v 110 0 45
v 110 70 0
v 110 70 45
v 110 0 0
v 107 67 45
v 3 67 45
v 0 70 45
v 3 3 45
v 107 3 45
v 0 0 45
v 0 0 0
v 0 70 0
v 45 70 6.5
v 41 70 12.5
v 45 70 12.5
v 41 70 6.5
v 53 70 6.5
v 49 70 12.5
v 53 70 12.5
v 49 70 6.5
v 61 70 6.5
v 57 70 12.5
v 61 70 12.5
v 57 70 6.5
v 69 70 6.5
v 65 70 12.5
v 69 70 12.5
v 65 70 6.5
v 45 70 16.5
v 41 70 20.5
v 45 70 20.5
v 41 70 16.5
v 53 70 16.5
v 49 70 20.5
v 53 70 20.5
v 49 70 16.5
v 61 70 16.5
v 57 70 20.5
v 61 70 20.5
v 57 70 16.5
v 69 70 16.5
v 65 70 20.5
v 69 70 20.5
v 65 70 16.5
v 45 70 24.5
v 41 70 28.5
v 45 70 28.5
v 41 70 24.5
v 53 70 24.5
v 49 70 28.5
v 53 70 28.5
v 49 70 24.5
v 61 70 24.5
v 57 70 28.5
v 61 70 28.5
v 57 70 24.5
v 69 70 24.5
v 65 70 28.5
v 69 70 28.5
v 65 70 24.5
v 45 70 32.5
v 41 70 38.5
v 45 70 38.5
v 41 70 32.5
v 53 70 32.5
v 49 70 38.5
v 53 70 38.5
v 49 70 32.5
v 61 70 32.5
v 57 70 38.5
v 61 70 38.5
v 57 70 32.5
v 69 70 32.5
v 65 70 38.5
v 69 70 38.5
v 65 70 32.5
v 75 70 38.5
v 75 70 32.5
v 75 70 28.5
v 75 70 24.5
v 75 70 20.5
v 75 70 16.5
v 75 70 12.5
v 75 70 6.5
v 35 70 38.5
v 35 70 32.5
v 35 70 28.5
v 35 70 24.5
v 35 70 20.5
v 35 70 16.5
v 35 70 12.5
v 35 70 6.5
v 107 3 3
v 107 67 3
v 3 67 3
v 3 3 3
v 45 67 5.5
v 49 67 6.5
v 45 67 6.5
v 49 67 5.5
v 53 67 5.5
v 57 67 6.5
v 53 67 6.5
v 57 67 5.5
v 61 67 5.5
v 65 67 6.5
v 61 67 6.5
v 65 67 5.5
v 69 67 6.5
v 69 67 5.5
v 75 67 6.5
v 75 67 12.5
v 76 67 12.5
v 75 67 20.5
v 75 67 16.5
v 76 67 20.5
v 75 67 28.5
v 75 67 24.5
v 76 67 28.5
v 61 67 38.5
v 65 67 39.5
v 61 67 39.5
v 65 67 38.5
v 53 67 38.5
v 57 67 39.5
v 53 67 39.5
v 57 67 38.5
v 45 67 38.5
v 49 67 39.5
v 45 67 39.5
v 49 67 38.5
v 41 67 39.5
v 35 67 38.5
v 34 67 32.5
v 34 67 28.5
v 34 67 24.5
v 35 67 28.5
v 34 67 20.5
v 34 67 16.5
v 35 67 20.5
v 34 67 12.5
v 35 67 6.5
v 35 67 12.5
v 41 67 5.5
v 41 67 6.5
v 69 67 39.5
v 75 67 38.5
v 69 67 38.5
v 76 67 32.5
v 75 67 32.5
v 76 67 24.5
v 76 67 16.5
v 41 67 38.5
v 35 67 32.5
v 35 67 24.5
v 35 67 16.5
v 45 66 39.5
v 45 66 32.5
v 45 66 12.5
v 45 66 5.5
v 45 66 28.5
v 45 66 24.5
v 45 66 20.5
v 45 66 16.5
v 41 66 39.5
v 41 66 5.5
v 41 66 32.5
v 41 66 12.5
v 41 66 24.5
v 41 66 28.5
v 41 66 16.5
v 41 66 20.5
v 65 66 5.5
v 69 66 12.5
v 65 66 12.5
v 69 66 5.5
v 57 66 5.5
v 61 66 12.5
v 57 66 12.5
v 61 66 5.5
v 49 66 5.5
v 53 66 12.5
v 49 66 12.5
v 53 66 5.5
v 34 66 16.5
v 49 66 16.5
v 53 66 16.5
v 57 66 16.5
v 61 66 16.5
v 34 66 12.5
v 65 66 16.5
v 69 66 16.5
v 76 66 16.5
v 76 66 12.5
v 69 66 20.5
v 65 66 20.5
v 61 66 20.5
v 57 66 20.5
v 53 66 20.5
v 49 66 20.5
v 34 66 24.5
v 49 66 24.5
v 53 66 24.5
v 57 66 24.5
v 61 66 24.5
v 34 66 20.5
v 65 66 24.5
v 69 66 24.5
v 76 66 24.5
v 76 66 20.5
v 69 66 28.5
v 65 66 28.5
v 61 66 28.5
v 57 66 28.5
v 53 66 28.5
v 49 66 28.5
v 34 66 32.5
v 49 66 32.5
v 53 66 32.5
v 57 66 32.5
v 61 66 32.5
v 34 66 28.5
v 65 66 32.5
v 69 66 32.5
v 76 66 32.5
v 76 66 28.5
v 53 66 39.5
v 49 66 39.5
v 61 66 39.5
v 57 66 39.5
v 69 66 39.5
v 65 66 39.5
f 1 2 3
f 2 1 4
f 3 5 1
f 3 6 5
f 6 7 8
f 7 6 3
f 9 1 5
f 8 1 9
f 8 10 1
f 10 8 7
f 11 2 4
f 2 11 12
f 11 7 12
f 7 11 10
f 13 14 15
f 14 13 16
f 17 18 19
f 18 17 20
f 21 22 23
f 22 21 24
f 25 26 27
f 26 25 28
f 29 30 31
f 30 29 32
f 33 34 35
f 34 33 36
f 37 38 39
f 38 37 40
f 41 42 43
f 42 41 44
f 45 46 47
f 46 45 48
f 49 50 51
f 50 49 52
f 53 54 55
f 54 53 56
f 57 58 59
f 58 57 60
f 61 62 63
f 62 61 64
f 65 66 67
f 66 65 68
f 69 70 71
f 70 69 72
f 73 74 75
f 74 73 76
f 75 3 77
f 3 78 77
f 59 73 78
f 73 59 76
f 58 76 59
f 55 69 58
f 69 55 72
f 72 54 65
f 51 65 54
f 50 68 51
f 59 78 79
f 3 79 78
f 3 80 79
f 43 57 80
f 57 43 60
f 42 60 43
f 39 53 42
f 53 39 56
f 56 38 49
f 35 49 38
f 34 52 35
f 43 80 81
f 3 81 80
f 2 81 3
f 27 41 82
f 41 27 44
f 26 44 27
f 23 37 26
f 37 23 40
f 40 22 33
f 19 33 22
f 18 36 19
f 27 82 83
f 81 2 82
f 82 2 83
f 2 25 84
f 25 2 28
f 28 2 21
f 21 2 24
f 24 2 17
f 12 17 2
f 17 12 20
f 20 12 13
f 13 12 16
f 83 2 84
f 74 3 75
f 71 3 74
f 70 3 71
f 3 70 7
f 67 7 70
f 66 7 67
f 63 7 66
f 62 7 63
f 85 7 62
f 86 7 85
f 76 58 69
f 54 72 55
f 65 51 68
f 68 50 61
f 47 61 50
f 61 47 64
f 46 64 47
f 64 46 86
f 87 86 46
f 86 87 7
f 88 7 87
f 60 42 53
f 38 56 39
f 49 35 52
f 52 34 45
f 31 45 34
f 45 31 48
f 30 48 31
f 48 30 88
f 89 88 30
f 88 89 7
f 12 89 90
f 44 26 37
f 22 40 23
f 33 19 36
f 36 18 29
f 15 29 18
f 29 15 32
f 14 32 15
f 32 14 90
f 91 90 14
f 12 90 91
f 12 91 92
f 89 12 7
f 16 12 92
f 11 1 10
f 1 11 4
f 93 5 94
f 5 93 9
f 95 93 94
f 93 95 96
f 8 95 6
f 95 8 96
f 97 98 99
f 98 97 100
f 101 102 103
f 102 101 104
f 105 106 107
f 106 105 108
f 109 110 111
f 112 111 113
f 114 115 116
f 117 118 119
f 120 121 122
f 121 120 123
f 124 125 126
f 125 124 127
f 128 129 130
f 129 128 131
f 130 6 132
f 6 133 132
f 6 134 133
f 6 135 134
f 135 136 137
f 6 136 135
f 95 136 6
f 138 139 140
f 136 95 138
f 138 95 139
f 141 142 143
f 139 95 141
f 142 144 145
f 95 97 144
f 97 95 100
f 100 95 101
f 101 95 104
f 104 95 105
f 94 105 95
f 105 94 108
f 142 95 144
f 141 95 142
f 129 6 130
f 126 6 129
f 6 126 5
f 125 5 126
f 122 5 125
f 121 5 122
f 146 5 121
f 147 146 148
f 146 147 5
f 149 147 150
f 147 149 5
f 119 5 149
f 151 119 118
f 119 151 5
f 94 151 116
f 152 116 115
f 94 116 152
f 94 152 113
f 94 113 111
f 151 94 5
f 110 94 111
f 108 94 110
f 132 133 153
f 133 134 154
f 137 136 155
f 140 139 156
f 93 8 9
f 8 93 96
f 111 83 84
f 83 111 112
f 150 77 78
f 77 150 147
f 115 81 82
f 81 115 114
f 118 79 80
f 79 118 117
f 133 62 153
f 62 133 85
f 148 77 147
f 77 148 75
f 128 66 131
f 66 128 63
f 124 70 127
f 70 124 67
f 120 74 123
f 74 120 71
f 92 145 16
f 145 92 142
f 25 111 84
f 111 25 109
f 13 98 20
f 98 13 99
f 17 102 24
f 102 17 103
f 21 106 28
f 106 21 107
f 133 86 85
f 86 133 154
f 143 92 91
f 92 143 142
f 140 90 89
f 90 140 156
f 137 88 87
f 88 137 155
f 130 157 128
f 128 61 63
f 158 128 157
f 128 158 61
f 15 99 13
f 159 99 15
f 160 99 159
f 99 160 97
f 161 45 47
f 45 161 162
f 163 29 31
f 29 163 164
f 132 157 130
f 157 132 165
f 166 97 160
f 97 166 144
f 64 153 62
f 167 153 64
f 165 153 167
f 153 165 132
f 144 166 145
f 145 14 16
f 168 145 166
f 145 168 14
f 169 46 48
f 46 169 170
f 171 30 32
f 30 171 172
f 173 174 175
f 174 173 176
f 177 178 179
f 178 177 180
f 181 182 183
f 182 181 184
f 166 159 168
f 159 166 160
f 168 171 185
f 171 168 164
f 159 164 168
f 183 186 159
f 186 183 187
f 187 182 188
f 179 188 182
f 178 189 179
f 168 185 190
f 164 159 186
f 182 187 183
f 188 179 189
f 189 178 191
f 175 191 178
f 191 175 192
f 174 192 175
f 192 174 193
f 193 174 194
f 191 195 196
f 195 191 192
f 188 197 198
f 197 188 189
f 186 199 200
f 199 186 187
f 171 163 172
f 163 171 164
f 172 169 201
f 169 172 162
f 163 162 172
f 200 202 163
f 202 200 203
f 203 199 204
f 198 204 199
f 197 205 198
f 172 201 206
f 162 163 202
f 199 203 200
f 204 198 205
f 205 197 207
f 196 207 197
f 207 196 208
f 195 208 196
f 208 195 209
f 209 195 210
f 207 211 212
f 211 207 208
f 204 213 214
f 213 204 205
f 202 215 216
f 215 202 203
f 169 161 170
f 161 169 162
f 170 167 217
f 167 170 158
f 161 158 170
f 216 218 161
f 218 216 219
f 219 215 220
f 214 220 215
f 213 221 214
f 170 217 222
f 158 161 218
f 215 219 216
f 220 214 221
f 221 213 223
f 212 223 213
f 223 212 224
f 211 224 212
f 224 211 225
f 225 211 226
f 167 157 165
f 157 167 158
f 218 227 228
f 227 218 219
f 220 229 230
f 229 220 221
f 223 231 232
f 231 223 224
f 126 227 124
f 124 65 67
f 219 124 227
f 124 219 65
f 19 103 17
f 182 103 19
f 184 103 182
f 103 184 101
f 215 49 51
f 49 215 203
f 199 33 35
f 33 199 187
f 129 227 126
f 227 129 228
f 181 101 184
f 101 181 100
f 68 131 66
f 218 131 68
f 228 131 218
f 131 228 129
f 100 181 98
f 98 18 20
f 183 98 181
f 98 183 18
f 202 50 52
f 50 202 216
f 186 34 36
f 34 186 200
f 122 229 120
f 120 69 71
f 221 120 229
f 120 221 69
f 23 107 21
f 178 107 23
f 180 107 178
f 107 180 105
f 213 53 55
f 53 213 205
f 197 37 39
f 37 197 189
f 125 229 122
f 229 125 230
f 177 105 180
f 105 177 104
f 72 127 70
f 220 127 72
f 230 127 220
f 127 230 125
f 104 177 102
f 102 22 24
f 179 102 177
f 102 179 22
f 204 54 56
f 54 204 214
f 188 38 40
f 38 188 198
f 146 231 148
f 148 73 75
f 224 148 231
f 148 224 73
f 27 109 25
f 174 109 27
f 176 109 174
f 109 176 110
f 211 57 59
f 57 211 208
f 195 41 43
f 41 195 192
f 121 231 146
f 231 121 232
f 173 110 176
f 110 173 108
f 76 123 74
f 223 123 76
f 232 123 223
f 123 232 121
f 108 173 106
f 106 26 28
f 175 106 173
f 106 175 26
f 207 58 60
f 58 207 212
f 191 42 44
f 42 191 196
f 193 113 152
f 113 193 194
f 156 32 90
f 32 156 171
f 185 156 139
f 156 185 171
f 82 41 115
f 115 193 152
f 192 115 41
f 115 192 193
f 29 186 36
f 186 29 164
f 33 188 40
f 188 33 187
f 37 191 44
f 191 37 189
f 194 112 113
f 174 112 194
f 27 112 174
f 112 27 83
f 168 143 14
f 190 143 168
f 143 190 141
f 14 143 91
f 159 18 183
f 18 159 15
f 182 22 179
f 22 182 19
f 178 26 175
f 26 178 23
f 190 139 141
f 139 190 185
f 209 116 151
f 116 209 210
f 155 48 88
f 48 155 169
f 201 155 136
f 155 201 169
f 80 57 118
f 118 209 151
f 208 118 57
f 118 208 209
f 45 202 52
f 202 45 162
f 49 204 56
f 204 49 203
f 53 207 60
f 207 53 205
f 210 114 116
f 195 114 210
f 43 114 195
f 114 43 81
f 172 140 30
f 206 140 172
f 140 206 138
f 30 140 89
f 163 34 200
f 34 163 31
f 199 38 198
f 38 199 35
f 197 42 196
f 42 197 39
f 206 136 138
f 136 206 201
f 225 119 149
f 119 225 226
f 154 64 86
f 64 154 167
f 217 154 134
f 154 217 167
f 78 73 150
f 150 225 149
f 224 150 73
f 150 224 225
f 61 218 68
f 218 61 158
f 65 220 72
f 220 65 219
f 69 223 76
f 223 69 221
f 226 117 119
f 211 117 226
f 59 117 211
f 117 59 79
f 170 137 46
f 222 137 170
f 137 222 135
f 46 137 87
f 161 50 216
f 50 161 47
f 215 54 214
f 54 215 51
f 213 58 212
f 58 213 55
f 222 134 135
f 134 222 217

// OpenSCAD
$fn = 32;

// ----------------------------------------------------------------------
// Vent box: crossgrid enclosure
// ----------------------------------------------------------------------

// --- parameters (mm) ---
box_l = 110;              // box length, X
box_w = 70;               // box width, Y
box_h = 45;               // box height, Z
wall_t = 3;               // shell wall thickness
win_l = 40;               // vent window width, X
win_h = 32;               // vent window height, Z
bar_w = 4;                // grid bar width
n_v = 4;                  // vertical bar count
n_h = 3;                  // horizontal bar count

win_z0 = (box_h - win_h) / 2;  // window lower edge Z
v_step = win_l / (n_v + 1);  // vertical bar step
h_step = win_h / (n_h + 1);  // horizontal bar step

difference() {
  union() {
    difference() {
      cube([box_l, box_w, box_h]);
  translate([wall_t, wall_t, wall_t])
    cube([box_l - 2 * wall_t, box_w - 2 * wall_t, box_h]);
  translate([(box_l - win_l) / 2, box_w - wall_t - 1, win_z0])
    cube([win_l, wall_t + 2, win_h]);
    }
    for (i = [1 : n_v])
      translate([(box_l - win_l) / 2 + i * v_step - bar_w / 2,
                 box_w - wall_t - 1, win_z0 - 1])
        cube([bar_w, wall_t + 1, win_h + 2]);
    for (i = [1 : n_h])
      translate([(box_l - win_l) / 2 - 1, box_w - wall_t - 1,
                 win_z0 + i * h_step - bar_w / 2])
        cube([win_l + 2, wall_t + 1, bar_w]);
  }
}
